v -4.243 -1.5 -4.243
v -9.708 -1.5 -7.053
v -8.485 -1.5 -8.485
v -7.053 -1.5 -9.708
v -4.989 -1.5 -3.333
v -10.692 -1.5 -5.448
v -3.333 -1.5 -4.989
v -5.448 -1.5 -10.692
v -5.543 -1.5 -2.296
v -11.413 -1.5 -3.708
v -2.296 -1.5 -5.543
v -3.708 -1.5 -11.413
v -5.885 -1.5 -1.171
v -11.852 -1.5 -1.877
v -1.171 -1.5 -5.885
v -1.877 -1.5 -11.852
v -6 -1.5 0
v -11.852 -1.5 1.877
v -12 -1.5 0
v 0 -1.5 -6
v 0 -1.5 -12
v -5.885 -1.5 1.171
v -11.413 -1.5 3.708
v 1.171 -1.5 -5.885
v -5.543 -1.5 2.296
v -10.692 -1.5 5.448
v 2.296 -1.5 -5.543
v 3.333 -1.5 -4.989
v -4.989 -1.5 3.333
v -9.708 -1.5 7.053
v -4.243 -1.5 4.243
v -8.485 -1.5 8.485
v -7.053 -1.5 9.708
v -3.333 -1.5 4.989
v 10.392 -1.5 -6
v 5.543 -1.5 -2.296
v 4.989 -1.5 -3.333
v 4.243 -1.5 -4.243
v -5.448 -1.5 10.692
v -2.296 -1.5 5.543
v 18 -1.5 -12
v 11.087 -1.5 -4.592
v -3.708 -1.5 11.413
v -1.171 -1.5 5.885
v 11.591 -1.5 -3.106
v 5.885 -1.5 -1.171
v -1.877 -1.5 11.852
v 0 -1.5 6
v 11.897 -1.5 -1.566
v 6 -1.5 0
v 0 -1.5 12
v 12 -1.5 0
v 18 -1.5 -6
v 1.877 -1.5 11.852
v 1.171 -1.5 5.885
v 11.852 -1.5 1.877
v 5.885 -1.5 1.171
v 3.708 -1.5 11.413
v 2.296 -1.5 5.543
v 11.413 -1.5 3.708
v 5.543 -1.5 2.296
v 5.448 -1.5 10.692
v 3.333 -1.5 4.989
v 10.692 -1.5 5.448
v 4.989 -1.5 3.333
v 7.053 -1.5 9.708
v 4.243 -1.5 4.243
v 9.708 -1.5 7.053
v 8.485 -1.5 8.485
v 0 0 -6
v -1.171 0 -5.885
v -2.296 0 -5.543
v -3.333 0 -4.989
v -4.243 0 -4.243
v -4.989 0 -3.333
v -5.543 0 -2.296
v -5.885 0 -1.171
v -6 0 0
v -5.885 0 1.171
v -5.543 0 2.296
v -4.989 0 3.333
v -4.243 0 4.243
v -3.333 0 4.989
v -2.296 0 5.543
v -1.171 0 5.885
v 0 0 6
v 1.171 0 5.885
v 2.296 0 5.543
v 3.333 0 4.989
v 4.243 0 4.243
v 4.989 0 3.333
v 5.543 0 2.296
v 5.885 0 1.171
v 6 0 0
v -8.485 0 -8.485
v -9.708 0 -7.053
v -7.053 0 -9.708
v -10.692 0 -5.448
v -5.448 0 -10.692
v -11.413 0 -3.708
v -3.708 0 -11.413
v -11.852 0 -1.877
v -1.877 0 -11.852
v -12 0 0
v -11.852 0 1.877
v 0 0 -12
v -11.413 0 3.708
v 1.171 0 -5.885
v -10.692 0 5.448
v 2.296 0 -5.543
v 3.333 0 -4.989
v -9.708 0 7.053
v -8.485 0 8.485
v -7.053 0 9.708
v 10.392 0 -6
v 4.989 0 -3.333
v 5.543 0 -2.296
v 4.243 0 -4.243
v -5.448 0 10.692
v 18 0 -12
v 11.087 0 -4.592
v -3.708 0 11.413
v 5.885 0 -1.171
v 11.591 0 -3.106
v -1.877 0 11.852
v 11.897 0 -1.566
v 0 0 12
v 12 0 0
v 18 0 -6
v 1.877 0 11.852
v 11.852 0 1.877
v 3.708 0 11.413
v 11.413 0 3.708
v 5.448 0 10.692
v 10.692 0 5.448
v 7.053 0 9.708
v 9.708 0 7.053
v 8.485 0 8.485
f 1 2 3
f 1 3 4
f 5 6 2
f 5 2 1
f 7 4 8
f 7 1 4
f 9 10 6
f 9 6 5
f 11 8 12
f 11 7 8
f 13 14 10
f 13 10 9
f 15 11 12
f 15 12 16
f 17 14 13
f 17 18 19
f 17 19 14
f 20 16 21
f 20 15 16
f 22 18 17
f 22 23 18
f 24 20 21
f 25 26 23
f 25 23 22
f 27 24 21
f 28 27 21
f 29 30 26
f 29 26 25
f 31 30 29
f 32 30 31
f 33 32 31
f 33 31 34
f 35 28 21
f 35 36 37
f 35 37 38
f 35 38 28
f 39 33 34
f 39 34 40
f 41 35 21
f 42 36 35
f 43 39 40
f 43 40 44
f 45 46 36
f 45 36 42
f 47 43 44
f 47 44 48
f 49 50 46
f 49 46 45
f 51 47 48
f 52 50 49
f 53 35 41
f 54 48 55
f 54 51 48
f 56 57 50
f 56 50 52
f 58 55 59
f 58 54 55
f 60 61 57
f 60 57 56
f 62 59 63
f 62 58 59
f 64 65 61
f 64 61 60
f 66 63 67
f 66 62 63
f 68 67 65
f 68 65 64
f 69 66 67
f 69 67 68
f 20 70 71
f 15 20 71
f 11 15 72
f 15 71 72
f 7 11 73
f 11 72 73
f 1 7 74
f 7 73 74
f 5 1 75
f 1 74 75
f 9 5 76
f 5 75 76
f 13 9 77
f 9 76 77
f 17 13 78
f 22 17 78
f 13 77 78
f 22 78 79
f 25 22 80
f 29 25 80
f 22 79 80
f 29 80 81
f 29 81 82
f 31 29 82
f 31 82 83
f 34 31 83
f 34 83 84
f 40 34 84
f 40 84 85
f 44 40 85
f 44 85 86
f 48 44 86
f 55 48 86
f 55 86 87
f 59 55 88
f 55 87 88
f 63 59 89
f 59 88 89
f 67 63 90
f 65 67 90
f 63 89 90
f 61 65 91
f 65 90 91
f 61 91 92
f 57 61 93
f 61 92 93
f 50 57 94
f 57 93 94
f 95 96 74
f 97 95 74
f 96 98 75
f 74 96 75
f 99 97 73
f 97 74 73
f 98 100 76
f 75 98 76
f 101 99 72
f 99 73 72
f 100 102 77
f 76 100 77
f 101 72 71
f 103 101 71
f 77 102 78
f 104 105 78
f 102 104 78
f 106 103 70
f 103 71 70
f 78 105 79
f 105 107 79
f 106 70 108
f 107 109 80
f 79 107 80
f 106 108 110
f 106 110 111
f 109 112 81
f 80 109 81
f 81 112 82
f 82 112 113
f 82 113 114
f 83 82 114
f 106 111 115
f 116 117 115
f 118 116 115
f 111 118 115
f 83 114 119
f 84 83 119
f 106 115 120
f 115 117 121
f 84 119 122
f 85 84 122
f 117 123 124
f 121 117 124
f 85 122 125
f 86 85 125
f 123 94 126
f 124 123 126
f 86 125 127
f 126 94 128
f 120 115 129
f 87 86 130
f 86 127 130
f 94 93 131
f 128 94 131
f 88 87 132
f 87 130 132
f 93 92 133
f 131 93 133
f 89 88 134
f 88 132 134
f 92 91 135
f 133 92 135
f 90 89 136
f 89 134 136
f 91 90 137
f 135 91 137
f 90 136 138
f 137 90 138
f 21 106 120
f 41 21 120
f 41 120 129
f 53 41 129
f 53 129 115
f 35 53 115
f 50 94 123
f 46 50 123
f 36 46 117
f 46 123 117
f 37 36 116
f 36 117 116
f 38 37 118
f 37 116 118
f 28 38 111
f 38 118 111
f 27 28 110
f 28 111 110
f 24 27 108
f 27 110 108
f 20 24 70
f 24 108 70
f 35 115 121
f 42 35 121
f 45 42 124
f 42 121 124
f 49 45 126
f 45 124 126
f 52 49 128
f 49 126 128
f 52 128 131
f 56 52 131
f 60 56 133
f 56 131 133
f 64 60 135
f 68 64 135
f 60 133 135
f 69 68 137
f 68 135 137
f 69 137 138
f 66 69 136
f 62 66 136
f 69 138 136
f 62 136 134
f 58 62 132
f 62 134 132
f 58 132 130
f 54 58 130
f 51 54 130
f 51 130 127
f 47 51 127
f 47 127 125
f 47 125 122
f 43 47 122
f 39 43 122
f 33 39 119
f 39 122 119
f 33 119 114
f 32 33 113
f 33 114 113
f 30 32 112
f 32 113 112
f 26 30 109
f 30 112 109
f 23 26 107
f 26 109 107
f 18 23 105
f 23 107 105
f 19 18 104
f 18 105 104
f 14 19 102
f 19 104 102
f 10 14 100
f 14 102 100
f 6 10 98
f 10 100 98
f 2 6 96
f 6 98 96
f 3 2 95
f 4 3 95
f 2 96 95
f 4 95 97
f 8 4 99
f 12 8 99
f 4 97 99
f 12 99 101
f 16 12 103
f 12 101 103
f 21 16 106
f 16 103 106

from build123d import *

# Parameters (mm, degrees)
F1_DEPTH = 1.5


with BuildPart() as f1:
    # F0 (on Front) → F1 (new body)
    with BuildSketch(Plane.XZ):
        with BuildLine():
            Line((0, -12), (0, -6))
            Line((0, -6), (10.392305, -6))
            ThreePointArc((10.392305, -6), (11.59111, -3.105829), (12, 0))
            ThreePointArc((12, 0), (-8.485281, 8.485281), (0, -12))
        make_face()
        with BuildLine():
            ThreePointArc((0, -6), (-4.242641, 4.242641), (6, 0))
            ThreePointArc((6, 0), (4.242641, -4.242641), (0, -6))
        make_face(mode=Mode.SUBTRACT)
        with BuildLine():
            Line((18, -6), (10.392305, -6))
            ThreePointArc((10.392305, -6), (6, -10.392305), (0, -12))
            Line((0, -12), (18, -12))
            Line((18, -12), (18, -6))
        make_face()
        with BuildLine():
            Line((10.392305, -6), (0, -6))
            Line((0, -6), (0, -12))
            ThreePointArc((0, -12), (6, -10.392305), (10.392305, -6))
        make_face()
    extrude(amount=F1_DEPTH)


solid = f1.part
